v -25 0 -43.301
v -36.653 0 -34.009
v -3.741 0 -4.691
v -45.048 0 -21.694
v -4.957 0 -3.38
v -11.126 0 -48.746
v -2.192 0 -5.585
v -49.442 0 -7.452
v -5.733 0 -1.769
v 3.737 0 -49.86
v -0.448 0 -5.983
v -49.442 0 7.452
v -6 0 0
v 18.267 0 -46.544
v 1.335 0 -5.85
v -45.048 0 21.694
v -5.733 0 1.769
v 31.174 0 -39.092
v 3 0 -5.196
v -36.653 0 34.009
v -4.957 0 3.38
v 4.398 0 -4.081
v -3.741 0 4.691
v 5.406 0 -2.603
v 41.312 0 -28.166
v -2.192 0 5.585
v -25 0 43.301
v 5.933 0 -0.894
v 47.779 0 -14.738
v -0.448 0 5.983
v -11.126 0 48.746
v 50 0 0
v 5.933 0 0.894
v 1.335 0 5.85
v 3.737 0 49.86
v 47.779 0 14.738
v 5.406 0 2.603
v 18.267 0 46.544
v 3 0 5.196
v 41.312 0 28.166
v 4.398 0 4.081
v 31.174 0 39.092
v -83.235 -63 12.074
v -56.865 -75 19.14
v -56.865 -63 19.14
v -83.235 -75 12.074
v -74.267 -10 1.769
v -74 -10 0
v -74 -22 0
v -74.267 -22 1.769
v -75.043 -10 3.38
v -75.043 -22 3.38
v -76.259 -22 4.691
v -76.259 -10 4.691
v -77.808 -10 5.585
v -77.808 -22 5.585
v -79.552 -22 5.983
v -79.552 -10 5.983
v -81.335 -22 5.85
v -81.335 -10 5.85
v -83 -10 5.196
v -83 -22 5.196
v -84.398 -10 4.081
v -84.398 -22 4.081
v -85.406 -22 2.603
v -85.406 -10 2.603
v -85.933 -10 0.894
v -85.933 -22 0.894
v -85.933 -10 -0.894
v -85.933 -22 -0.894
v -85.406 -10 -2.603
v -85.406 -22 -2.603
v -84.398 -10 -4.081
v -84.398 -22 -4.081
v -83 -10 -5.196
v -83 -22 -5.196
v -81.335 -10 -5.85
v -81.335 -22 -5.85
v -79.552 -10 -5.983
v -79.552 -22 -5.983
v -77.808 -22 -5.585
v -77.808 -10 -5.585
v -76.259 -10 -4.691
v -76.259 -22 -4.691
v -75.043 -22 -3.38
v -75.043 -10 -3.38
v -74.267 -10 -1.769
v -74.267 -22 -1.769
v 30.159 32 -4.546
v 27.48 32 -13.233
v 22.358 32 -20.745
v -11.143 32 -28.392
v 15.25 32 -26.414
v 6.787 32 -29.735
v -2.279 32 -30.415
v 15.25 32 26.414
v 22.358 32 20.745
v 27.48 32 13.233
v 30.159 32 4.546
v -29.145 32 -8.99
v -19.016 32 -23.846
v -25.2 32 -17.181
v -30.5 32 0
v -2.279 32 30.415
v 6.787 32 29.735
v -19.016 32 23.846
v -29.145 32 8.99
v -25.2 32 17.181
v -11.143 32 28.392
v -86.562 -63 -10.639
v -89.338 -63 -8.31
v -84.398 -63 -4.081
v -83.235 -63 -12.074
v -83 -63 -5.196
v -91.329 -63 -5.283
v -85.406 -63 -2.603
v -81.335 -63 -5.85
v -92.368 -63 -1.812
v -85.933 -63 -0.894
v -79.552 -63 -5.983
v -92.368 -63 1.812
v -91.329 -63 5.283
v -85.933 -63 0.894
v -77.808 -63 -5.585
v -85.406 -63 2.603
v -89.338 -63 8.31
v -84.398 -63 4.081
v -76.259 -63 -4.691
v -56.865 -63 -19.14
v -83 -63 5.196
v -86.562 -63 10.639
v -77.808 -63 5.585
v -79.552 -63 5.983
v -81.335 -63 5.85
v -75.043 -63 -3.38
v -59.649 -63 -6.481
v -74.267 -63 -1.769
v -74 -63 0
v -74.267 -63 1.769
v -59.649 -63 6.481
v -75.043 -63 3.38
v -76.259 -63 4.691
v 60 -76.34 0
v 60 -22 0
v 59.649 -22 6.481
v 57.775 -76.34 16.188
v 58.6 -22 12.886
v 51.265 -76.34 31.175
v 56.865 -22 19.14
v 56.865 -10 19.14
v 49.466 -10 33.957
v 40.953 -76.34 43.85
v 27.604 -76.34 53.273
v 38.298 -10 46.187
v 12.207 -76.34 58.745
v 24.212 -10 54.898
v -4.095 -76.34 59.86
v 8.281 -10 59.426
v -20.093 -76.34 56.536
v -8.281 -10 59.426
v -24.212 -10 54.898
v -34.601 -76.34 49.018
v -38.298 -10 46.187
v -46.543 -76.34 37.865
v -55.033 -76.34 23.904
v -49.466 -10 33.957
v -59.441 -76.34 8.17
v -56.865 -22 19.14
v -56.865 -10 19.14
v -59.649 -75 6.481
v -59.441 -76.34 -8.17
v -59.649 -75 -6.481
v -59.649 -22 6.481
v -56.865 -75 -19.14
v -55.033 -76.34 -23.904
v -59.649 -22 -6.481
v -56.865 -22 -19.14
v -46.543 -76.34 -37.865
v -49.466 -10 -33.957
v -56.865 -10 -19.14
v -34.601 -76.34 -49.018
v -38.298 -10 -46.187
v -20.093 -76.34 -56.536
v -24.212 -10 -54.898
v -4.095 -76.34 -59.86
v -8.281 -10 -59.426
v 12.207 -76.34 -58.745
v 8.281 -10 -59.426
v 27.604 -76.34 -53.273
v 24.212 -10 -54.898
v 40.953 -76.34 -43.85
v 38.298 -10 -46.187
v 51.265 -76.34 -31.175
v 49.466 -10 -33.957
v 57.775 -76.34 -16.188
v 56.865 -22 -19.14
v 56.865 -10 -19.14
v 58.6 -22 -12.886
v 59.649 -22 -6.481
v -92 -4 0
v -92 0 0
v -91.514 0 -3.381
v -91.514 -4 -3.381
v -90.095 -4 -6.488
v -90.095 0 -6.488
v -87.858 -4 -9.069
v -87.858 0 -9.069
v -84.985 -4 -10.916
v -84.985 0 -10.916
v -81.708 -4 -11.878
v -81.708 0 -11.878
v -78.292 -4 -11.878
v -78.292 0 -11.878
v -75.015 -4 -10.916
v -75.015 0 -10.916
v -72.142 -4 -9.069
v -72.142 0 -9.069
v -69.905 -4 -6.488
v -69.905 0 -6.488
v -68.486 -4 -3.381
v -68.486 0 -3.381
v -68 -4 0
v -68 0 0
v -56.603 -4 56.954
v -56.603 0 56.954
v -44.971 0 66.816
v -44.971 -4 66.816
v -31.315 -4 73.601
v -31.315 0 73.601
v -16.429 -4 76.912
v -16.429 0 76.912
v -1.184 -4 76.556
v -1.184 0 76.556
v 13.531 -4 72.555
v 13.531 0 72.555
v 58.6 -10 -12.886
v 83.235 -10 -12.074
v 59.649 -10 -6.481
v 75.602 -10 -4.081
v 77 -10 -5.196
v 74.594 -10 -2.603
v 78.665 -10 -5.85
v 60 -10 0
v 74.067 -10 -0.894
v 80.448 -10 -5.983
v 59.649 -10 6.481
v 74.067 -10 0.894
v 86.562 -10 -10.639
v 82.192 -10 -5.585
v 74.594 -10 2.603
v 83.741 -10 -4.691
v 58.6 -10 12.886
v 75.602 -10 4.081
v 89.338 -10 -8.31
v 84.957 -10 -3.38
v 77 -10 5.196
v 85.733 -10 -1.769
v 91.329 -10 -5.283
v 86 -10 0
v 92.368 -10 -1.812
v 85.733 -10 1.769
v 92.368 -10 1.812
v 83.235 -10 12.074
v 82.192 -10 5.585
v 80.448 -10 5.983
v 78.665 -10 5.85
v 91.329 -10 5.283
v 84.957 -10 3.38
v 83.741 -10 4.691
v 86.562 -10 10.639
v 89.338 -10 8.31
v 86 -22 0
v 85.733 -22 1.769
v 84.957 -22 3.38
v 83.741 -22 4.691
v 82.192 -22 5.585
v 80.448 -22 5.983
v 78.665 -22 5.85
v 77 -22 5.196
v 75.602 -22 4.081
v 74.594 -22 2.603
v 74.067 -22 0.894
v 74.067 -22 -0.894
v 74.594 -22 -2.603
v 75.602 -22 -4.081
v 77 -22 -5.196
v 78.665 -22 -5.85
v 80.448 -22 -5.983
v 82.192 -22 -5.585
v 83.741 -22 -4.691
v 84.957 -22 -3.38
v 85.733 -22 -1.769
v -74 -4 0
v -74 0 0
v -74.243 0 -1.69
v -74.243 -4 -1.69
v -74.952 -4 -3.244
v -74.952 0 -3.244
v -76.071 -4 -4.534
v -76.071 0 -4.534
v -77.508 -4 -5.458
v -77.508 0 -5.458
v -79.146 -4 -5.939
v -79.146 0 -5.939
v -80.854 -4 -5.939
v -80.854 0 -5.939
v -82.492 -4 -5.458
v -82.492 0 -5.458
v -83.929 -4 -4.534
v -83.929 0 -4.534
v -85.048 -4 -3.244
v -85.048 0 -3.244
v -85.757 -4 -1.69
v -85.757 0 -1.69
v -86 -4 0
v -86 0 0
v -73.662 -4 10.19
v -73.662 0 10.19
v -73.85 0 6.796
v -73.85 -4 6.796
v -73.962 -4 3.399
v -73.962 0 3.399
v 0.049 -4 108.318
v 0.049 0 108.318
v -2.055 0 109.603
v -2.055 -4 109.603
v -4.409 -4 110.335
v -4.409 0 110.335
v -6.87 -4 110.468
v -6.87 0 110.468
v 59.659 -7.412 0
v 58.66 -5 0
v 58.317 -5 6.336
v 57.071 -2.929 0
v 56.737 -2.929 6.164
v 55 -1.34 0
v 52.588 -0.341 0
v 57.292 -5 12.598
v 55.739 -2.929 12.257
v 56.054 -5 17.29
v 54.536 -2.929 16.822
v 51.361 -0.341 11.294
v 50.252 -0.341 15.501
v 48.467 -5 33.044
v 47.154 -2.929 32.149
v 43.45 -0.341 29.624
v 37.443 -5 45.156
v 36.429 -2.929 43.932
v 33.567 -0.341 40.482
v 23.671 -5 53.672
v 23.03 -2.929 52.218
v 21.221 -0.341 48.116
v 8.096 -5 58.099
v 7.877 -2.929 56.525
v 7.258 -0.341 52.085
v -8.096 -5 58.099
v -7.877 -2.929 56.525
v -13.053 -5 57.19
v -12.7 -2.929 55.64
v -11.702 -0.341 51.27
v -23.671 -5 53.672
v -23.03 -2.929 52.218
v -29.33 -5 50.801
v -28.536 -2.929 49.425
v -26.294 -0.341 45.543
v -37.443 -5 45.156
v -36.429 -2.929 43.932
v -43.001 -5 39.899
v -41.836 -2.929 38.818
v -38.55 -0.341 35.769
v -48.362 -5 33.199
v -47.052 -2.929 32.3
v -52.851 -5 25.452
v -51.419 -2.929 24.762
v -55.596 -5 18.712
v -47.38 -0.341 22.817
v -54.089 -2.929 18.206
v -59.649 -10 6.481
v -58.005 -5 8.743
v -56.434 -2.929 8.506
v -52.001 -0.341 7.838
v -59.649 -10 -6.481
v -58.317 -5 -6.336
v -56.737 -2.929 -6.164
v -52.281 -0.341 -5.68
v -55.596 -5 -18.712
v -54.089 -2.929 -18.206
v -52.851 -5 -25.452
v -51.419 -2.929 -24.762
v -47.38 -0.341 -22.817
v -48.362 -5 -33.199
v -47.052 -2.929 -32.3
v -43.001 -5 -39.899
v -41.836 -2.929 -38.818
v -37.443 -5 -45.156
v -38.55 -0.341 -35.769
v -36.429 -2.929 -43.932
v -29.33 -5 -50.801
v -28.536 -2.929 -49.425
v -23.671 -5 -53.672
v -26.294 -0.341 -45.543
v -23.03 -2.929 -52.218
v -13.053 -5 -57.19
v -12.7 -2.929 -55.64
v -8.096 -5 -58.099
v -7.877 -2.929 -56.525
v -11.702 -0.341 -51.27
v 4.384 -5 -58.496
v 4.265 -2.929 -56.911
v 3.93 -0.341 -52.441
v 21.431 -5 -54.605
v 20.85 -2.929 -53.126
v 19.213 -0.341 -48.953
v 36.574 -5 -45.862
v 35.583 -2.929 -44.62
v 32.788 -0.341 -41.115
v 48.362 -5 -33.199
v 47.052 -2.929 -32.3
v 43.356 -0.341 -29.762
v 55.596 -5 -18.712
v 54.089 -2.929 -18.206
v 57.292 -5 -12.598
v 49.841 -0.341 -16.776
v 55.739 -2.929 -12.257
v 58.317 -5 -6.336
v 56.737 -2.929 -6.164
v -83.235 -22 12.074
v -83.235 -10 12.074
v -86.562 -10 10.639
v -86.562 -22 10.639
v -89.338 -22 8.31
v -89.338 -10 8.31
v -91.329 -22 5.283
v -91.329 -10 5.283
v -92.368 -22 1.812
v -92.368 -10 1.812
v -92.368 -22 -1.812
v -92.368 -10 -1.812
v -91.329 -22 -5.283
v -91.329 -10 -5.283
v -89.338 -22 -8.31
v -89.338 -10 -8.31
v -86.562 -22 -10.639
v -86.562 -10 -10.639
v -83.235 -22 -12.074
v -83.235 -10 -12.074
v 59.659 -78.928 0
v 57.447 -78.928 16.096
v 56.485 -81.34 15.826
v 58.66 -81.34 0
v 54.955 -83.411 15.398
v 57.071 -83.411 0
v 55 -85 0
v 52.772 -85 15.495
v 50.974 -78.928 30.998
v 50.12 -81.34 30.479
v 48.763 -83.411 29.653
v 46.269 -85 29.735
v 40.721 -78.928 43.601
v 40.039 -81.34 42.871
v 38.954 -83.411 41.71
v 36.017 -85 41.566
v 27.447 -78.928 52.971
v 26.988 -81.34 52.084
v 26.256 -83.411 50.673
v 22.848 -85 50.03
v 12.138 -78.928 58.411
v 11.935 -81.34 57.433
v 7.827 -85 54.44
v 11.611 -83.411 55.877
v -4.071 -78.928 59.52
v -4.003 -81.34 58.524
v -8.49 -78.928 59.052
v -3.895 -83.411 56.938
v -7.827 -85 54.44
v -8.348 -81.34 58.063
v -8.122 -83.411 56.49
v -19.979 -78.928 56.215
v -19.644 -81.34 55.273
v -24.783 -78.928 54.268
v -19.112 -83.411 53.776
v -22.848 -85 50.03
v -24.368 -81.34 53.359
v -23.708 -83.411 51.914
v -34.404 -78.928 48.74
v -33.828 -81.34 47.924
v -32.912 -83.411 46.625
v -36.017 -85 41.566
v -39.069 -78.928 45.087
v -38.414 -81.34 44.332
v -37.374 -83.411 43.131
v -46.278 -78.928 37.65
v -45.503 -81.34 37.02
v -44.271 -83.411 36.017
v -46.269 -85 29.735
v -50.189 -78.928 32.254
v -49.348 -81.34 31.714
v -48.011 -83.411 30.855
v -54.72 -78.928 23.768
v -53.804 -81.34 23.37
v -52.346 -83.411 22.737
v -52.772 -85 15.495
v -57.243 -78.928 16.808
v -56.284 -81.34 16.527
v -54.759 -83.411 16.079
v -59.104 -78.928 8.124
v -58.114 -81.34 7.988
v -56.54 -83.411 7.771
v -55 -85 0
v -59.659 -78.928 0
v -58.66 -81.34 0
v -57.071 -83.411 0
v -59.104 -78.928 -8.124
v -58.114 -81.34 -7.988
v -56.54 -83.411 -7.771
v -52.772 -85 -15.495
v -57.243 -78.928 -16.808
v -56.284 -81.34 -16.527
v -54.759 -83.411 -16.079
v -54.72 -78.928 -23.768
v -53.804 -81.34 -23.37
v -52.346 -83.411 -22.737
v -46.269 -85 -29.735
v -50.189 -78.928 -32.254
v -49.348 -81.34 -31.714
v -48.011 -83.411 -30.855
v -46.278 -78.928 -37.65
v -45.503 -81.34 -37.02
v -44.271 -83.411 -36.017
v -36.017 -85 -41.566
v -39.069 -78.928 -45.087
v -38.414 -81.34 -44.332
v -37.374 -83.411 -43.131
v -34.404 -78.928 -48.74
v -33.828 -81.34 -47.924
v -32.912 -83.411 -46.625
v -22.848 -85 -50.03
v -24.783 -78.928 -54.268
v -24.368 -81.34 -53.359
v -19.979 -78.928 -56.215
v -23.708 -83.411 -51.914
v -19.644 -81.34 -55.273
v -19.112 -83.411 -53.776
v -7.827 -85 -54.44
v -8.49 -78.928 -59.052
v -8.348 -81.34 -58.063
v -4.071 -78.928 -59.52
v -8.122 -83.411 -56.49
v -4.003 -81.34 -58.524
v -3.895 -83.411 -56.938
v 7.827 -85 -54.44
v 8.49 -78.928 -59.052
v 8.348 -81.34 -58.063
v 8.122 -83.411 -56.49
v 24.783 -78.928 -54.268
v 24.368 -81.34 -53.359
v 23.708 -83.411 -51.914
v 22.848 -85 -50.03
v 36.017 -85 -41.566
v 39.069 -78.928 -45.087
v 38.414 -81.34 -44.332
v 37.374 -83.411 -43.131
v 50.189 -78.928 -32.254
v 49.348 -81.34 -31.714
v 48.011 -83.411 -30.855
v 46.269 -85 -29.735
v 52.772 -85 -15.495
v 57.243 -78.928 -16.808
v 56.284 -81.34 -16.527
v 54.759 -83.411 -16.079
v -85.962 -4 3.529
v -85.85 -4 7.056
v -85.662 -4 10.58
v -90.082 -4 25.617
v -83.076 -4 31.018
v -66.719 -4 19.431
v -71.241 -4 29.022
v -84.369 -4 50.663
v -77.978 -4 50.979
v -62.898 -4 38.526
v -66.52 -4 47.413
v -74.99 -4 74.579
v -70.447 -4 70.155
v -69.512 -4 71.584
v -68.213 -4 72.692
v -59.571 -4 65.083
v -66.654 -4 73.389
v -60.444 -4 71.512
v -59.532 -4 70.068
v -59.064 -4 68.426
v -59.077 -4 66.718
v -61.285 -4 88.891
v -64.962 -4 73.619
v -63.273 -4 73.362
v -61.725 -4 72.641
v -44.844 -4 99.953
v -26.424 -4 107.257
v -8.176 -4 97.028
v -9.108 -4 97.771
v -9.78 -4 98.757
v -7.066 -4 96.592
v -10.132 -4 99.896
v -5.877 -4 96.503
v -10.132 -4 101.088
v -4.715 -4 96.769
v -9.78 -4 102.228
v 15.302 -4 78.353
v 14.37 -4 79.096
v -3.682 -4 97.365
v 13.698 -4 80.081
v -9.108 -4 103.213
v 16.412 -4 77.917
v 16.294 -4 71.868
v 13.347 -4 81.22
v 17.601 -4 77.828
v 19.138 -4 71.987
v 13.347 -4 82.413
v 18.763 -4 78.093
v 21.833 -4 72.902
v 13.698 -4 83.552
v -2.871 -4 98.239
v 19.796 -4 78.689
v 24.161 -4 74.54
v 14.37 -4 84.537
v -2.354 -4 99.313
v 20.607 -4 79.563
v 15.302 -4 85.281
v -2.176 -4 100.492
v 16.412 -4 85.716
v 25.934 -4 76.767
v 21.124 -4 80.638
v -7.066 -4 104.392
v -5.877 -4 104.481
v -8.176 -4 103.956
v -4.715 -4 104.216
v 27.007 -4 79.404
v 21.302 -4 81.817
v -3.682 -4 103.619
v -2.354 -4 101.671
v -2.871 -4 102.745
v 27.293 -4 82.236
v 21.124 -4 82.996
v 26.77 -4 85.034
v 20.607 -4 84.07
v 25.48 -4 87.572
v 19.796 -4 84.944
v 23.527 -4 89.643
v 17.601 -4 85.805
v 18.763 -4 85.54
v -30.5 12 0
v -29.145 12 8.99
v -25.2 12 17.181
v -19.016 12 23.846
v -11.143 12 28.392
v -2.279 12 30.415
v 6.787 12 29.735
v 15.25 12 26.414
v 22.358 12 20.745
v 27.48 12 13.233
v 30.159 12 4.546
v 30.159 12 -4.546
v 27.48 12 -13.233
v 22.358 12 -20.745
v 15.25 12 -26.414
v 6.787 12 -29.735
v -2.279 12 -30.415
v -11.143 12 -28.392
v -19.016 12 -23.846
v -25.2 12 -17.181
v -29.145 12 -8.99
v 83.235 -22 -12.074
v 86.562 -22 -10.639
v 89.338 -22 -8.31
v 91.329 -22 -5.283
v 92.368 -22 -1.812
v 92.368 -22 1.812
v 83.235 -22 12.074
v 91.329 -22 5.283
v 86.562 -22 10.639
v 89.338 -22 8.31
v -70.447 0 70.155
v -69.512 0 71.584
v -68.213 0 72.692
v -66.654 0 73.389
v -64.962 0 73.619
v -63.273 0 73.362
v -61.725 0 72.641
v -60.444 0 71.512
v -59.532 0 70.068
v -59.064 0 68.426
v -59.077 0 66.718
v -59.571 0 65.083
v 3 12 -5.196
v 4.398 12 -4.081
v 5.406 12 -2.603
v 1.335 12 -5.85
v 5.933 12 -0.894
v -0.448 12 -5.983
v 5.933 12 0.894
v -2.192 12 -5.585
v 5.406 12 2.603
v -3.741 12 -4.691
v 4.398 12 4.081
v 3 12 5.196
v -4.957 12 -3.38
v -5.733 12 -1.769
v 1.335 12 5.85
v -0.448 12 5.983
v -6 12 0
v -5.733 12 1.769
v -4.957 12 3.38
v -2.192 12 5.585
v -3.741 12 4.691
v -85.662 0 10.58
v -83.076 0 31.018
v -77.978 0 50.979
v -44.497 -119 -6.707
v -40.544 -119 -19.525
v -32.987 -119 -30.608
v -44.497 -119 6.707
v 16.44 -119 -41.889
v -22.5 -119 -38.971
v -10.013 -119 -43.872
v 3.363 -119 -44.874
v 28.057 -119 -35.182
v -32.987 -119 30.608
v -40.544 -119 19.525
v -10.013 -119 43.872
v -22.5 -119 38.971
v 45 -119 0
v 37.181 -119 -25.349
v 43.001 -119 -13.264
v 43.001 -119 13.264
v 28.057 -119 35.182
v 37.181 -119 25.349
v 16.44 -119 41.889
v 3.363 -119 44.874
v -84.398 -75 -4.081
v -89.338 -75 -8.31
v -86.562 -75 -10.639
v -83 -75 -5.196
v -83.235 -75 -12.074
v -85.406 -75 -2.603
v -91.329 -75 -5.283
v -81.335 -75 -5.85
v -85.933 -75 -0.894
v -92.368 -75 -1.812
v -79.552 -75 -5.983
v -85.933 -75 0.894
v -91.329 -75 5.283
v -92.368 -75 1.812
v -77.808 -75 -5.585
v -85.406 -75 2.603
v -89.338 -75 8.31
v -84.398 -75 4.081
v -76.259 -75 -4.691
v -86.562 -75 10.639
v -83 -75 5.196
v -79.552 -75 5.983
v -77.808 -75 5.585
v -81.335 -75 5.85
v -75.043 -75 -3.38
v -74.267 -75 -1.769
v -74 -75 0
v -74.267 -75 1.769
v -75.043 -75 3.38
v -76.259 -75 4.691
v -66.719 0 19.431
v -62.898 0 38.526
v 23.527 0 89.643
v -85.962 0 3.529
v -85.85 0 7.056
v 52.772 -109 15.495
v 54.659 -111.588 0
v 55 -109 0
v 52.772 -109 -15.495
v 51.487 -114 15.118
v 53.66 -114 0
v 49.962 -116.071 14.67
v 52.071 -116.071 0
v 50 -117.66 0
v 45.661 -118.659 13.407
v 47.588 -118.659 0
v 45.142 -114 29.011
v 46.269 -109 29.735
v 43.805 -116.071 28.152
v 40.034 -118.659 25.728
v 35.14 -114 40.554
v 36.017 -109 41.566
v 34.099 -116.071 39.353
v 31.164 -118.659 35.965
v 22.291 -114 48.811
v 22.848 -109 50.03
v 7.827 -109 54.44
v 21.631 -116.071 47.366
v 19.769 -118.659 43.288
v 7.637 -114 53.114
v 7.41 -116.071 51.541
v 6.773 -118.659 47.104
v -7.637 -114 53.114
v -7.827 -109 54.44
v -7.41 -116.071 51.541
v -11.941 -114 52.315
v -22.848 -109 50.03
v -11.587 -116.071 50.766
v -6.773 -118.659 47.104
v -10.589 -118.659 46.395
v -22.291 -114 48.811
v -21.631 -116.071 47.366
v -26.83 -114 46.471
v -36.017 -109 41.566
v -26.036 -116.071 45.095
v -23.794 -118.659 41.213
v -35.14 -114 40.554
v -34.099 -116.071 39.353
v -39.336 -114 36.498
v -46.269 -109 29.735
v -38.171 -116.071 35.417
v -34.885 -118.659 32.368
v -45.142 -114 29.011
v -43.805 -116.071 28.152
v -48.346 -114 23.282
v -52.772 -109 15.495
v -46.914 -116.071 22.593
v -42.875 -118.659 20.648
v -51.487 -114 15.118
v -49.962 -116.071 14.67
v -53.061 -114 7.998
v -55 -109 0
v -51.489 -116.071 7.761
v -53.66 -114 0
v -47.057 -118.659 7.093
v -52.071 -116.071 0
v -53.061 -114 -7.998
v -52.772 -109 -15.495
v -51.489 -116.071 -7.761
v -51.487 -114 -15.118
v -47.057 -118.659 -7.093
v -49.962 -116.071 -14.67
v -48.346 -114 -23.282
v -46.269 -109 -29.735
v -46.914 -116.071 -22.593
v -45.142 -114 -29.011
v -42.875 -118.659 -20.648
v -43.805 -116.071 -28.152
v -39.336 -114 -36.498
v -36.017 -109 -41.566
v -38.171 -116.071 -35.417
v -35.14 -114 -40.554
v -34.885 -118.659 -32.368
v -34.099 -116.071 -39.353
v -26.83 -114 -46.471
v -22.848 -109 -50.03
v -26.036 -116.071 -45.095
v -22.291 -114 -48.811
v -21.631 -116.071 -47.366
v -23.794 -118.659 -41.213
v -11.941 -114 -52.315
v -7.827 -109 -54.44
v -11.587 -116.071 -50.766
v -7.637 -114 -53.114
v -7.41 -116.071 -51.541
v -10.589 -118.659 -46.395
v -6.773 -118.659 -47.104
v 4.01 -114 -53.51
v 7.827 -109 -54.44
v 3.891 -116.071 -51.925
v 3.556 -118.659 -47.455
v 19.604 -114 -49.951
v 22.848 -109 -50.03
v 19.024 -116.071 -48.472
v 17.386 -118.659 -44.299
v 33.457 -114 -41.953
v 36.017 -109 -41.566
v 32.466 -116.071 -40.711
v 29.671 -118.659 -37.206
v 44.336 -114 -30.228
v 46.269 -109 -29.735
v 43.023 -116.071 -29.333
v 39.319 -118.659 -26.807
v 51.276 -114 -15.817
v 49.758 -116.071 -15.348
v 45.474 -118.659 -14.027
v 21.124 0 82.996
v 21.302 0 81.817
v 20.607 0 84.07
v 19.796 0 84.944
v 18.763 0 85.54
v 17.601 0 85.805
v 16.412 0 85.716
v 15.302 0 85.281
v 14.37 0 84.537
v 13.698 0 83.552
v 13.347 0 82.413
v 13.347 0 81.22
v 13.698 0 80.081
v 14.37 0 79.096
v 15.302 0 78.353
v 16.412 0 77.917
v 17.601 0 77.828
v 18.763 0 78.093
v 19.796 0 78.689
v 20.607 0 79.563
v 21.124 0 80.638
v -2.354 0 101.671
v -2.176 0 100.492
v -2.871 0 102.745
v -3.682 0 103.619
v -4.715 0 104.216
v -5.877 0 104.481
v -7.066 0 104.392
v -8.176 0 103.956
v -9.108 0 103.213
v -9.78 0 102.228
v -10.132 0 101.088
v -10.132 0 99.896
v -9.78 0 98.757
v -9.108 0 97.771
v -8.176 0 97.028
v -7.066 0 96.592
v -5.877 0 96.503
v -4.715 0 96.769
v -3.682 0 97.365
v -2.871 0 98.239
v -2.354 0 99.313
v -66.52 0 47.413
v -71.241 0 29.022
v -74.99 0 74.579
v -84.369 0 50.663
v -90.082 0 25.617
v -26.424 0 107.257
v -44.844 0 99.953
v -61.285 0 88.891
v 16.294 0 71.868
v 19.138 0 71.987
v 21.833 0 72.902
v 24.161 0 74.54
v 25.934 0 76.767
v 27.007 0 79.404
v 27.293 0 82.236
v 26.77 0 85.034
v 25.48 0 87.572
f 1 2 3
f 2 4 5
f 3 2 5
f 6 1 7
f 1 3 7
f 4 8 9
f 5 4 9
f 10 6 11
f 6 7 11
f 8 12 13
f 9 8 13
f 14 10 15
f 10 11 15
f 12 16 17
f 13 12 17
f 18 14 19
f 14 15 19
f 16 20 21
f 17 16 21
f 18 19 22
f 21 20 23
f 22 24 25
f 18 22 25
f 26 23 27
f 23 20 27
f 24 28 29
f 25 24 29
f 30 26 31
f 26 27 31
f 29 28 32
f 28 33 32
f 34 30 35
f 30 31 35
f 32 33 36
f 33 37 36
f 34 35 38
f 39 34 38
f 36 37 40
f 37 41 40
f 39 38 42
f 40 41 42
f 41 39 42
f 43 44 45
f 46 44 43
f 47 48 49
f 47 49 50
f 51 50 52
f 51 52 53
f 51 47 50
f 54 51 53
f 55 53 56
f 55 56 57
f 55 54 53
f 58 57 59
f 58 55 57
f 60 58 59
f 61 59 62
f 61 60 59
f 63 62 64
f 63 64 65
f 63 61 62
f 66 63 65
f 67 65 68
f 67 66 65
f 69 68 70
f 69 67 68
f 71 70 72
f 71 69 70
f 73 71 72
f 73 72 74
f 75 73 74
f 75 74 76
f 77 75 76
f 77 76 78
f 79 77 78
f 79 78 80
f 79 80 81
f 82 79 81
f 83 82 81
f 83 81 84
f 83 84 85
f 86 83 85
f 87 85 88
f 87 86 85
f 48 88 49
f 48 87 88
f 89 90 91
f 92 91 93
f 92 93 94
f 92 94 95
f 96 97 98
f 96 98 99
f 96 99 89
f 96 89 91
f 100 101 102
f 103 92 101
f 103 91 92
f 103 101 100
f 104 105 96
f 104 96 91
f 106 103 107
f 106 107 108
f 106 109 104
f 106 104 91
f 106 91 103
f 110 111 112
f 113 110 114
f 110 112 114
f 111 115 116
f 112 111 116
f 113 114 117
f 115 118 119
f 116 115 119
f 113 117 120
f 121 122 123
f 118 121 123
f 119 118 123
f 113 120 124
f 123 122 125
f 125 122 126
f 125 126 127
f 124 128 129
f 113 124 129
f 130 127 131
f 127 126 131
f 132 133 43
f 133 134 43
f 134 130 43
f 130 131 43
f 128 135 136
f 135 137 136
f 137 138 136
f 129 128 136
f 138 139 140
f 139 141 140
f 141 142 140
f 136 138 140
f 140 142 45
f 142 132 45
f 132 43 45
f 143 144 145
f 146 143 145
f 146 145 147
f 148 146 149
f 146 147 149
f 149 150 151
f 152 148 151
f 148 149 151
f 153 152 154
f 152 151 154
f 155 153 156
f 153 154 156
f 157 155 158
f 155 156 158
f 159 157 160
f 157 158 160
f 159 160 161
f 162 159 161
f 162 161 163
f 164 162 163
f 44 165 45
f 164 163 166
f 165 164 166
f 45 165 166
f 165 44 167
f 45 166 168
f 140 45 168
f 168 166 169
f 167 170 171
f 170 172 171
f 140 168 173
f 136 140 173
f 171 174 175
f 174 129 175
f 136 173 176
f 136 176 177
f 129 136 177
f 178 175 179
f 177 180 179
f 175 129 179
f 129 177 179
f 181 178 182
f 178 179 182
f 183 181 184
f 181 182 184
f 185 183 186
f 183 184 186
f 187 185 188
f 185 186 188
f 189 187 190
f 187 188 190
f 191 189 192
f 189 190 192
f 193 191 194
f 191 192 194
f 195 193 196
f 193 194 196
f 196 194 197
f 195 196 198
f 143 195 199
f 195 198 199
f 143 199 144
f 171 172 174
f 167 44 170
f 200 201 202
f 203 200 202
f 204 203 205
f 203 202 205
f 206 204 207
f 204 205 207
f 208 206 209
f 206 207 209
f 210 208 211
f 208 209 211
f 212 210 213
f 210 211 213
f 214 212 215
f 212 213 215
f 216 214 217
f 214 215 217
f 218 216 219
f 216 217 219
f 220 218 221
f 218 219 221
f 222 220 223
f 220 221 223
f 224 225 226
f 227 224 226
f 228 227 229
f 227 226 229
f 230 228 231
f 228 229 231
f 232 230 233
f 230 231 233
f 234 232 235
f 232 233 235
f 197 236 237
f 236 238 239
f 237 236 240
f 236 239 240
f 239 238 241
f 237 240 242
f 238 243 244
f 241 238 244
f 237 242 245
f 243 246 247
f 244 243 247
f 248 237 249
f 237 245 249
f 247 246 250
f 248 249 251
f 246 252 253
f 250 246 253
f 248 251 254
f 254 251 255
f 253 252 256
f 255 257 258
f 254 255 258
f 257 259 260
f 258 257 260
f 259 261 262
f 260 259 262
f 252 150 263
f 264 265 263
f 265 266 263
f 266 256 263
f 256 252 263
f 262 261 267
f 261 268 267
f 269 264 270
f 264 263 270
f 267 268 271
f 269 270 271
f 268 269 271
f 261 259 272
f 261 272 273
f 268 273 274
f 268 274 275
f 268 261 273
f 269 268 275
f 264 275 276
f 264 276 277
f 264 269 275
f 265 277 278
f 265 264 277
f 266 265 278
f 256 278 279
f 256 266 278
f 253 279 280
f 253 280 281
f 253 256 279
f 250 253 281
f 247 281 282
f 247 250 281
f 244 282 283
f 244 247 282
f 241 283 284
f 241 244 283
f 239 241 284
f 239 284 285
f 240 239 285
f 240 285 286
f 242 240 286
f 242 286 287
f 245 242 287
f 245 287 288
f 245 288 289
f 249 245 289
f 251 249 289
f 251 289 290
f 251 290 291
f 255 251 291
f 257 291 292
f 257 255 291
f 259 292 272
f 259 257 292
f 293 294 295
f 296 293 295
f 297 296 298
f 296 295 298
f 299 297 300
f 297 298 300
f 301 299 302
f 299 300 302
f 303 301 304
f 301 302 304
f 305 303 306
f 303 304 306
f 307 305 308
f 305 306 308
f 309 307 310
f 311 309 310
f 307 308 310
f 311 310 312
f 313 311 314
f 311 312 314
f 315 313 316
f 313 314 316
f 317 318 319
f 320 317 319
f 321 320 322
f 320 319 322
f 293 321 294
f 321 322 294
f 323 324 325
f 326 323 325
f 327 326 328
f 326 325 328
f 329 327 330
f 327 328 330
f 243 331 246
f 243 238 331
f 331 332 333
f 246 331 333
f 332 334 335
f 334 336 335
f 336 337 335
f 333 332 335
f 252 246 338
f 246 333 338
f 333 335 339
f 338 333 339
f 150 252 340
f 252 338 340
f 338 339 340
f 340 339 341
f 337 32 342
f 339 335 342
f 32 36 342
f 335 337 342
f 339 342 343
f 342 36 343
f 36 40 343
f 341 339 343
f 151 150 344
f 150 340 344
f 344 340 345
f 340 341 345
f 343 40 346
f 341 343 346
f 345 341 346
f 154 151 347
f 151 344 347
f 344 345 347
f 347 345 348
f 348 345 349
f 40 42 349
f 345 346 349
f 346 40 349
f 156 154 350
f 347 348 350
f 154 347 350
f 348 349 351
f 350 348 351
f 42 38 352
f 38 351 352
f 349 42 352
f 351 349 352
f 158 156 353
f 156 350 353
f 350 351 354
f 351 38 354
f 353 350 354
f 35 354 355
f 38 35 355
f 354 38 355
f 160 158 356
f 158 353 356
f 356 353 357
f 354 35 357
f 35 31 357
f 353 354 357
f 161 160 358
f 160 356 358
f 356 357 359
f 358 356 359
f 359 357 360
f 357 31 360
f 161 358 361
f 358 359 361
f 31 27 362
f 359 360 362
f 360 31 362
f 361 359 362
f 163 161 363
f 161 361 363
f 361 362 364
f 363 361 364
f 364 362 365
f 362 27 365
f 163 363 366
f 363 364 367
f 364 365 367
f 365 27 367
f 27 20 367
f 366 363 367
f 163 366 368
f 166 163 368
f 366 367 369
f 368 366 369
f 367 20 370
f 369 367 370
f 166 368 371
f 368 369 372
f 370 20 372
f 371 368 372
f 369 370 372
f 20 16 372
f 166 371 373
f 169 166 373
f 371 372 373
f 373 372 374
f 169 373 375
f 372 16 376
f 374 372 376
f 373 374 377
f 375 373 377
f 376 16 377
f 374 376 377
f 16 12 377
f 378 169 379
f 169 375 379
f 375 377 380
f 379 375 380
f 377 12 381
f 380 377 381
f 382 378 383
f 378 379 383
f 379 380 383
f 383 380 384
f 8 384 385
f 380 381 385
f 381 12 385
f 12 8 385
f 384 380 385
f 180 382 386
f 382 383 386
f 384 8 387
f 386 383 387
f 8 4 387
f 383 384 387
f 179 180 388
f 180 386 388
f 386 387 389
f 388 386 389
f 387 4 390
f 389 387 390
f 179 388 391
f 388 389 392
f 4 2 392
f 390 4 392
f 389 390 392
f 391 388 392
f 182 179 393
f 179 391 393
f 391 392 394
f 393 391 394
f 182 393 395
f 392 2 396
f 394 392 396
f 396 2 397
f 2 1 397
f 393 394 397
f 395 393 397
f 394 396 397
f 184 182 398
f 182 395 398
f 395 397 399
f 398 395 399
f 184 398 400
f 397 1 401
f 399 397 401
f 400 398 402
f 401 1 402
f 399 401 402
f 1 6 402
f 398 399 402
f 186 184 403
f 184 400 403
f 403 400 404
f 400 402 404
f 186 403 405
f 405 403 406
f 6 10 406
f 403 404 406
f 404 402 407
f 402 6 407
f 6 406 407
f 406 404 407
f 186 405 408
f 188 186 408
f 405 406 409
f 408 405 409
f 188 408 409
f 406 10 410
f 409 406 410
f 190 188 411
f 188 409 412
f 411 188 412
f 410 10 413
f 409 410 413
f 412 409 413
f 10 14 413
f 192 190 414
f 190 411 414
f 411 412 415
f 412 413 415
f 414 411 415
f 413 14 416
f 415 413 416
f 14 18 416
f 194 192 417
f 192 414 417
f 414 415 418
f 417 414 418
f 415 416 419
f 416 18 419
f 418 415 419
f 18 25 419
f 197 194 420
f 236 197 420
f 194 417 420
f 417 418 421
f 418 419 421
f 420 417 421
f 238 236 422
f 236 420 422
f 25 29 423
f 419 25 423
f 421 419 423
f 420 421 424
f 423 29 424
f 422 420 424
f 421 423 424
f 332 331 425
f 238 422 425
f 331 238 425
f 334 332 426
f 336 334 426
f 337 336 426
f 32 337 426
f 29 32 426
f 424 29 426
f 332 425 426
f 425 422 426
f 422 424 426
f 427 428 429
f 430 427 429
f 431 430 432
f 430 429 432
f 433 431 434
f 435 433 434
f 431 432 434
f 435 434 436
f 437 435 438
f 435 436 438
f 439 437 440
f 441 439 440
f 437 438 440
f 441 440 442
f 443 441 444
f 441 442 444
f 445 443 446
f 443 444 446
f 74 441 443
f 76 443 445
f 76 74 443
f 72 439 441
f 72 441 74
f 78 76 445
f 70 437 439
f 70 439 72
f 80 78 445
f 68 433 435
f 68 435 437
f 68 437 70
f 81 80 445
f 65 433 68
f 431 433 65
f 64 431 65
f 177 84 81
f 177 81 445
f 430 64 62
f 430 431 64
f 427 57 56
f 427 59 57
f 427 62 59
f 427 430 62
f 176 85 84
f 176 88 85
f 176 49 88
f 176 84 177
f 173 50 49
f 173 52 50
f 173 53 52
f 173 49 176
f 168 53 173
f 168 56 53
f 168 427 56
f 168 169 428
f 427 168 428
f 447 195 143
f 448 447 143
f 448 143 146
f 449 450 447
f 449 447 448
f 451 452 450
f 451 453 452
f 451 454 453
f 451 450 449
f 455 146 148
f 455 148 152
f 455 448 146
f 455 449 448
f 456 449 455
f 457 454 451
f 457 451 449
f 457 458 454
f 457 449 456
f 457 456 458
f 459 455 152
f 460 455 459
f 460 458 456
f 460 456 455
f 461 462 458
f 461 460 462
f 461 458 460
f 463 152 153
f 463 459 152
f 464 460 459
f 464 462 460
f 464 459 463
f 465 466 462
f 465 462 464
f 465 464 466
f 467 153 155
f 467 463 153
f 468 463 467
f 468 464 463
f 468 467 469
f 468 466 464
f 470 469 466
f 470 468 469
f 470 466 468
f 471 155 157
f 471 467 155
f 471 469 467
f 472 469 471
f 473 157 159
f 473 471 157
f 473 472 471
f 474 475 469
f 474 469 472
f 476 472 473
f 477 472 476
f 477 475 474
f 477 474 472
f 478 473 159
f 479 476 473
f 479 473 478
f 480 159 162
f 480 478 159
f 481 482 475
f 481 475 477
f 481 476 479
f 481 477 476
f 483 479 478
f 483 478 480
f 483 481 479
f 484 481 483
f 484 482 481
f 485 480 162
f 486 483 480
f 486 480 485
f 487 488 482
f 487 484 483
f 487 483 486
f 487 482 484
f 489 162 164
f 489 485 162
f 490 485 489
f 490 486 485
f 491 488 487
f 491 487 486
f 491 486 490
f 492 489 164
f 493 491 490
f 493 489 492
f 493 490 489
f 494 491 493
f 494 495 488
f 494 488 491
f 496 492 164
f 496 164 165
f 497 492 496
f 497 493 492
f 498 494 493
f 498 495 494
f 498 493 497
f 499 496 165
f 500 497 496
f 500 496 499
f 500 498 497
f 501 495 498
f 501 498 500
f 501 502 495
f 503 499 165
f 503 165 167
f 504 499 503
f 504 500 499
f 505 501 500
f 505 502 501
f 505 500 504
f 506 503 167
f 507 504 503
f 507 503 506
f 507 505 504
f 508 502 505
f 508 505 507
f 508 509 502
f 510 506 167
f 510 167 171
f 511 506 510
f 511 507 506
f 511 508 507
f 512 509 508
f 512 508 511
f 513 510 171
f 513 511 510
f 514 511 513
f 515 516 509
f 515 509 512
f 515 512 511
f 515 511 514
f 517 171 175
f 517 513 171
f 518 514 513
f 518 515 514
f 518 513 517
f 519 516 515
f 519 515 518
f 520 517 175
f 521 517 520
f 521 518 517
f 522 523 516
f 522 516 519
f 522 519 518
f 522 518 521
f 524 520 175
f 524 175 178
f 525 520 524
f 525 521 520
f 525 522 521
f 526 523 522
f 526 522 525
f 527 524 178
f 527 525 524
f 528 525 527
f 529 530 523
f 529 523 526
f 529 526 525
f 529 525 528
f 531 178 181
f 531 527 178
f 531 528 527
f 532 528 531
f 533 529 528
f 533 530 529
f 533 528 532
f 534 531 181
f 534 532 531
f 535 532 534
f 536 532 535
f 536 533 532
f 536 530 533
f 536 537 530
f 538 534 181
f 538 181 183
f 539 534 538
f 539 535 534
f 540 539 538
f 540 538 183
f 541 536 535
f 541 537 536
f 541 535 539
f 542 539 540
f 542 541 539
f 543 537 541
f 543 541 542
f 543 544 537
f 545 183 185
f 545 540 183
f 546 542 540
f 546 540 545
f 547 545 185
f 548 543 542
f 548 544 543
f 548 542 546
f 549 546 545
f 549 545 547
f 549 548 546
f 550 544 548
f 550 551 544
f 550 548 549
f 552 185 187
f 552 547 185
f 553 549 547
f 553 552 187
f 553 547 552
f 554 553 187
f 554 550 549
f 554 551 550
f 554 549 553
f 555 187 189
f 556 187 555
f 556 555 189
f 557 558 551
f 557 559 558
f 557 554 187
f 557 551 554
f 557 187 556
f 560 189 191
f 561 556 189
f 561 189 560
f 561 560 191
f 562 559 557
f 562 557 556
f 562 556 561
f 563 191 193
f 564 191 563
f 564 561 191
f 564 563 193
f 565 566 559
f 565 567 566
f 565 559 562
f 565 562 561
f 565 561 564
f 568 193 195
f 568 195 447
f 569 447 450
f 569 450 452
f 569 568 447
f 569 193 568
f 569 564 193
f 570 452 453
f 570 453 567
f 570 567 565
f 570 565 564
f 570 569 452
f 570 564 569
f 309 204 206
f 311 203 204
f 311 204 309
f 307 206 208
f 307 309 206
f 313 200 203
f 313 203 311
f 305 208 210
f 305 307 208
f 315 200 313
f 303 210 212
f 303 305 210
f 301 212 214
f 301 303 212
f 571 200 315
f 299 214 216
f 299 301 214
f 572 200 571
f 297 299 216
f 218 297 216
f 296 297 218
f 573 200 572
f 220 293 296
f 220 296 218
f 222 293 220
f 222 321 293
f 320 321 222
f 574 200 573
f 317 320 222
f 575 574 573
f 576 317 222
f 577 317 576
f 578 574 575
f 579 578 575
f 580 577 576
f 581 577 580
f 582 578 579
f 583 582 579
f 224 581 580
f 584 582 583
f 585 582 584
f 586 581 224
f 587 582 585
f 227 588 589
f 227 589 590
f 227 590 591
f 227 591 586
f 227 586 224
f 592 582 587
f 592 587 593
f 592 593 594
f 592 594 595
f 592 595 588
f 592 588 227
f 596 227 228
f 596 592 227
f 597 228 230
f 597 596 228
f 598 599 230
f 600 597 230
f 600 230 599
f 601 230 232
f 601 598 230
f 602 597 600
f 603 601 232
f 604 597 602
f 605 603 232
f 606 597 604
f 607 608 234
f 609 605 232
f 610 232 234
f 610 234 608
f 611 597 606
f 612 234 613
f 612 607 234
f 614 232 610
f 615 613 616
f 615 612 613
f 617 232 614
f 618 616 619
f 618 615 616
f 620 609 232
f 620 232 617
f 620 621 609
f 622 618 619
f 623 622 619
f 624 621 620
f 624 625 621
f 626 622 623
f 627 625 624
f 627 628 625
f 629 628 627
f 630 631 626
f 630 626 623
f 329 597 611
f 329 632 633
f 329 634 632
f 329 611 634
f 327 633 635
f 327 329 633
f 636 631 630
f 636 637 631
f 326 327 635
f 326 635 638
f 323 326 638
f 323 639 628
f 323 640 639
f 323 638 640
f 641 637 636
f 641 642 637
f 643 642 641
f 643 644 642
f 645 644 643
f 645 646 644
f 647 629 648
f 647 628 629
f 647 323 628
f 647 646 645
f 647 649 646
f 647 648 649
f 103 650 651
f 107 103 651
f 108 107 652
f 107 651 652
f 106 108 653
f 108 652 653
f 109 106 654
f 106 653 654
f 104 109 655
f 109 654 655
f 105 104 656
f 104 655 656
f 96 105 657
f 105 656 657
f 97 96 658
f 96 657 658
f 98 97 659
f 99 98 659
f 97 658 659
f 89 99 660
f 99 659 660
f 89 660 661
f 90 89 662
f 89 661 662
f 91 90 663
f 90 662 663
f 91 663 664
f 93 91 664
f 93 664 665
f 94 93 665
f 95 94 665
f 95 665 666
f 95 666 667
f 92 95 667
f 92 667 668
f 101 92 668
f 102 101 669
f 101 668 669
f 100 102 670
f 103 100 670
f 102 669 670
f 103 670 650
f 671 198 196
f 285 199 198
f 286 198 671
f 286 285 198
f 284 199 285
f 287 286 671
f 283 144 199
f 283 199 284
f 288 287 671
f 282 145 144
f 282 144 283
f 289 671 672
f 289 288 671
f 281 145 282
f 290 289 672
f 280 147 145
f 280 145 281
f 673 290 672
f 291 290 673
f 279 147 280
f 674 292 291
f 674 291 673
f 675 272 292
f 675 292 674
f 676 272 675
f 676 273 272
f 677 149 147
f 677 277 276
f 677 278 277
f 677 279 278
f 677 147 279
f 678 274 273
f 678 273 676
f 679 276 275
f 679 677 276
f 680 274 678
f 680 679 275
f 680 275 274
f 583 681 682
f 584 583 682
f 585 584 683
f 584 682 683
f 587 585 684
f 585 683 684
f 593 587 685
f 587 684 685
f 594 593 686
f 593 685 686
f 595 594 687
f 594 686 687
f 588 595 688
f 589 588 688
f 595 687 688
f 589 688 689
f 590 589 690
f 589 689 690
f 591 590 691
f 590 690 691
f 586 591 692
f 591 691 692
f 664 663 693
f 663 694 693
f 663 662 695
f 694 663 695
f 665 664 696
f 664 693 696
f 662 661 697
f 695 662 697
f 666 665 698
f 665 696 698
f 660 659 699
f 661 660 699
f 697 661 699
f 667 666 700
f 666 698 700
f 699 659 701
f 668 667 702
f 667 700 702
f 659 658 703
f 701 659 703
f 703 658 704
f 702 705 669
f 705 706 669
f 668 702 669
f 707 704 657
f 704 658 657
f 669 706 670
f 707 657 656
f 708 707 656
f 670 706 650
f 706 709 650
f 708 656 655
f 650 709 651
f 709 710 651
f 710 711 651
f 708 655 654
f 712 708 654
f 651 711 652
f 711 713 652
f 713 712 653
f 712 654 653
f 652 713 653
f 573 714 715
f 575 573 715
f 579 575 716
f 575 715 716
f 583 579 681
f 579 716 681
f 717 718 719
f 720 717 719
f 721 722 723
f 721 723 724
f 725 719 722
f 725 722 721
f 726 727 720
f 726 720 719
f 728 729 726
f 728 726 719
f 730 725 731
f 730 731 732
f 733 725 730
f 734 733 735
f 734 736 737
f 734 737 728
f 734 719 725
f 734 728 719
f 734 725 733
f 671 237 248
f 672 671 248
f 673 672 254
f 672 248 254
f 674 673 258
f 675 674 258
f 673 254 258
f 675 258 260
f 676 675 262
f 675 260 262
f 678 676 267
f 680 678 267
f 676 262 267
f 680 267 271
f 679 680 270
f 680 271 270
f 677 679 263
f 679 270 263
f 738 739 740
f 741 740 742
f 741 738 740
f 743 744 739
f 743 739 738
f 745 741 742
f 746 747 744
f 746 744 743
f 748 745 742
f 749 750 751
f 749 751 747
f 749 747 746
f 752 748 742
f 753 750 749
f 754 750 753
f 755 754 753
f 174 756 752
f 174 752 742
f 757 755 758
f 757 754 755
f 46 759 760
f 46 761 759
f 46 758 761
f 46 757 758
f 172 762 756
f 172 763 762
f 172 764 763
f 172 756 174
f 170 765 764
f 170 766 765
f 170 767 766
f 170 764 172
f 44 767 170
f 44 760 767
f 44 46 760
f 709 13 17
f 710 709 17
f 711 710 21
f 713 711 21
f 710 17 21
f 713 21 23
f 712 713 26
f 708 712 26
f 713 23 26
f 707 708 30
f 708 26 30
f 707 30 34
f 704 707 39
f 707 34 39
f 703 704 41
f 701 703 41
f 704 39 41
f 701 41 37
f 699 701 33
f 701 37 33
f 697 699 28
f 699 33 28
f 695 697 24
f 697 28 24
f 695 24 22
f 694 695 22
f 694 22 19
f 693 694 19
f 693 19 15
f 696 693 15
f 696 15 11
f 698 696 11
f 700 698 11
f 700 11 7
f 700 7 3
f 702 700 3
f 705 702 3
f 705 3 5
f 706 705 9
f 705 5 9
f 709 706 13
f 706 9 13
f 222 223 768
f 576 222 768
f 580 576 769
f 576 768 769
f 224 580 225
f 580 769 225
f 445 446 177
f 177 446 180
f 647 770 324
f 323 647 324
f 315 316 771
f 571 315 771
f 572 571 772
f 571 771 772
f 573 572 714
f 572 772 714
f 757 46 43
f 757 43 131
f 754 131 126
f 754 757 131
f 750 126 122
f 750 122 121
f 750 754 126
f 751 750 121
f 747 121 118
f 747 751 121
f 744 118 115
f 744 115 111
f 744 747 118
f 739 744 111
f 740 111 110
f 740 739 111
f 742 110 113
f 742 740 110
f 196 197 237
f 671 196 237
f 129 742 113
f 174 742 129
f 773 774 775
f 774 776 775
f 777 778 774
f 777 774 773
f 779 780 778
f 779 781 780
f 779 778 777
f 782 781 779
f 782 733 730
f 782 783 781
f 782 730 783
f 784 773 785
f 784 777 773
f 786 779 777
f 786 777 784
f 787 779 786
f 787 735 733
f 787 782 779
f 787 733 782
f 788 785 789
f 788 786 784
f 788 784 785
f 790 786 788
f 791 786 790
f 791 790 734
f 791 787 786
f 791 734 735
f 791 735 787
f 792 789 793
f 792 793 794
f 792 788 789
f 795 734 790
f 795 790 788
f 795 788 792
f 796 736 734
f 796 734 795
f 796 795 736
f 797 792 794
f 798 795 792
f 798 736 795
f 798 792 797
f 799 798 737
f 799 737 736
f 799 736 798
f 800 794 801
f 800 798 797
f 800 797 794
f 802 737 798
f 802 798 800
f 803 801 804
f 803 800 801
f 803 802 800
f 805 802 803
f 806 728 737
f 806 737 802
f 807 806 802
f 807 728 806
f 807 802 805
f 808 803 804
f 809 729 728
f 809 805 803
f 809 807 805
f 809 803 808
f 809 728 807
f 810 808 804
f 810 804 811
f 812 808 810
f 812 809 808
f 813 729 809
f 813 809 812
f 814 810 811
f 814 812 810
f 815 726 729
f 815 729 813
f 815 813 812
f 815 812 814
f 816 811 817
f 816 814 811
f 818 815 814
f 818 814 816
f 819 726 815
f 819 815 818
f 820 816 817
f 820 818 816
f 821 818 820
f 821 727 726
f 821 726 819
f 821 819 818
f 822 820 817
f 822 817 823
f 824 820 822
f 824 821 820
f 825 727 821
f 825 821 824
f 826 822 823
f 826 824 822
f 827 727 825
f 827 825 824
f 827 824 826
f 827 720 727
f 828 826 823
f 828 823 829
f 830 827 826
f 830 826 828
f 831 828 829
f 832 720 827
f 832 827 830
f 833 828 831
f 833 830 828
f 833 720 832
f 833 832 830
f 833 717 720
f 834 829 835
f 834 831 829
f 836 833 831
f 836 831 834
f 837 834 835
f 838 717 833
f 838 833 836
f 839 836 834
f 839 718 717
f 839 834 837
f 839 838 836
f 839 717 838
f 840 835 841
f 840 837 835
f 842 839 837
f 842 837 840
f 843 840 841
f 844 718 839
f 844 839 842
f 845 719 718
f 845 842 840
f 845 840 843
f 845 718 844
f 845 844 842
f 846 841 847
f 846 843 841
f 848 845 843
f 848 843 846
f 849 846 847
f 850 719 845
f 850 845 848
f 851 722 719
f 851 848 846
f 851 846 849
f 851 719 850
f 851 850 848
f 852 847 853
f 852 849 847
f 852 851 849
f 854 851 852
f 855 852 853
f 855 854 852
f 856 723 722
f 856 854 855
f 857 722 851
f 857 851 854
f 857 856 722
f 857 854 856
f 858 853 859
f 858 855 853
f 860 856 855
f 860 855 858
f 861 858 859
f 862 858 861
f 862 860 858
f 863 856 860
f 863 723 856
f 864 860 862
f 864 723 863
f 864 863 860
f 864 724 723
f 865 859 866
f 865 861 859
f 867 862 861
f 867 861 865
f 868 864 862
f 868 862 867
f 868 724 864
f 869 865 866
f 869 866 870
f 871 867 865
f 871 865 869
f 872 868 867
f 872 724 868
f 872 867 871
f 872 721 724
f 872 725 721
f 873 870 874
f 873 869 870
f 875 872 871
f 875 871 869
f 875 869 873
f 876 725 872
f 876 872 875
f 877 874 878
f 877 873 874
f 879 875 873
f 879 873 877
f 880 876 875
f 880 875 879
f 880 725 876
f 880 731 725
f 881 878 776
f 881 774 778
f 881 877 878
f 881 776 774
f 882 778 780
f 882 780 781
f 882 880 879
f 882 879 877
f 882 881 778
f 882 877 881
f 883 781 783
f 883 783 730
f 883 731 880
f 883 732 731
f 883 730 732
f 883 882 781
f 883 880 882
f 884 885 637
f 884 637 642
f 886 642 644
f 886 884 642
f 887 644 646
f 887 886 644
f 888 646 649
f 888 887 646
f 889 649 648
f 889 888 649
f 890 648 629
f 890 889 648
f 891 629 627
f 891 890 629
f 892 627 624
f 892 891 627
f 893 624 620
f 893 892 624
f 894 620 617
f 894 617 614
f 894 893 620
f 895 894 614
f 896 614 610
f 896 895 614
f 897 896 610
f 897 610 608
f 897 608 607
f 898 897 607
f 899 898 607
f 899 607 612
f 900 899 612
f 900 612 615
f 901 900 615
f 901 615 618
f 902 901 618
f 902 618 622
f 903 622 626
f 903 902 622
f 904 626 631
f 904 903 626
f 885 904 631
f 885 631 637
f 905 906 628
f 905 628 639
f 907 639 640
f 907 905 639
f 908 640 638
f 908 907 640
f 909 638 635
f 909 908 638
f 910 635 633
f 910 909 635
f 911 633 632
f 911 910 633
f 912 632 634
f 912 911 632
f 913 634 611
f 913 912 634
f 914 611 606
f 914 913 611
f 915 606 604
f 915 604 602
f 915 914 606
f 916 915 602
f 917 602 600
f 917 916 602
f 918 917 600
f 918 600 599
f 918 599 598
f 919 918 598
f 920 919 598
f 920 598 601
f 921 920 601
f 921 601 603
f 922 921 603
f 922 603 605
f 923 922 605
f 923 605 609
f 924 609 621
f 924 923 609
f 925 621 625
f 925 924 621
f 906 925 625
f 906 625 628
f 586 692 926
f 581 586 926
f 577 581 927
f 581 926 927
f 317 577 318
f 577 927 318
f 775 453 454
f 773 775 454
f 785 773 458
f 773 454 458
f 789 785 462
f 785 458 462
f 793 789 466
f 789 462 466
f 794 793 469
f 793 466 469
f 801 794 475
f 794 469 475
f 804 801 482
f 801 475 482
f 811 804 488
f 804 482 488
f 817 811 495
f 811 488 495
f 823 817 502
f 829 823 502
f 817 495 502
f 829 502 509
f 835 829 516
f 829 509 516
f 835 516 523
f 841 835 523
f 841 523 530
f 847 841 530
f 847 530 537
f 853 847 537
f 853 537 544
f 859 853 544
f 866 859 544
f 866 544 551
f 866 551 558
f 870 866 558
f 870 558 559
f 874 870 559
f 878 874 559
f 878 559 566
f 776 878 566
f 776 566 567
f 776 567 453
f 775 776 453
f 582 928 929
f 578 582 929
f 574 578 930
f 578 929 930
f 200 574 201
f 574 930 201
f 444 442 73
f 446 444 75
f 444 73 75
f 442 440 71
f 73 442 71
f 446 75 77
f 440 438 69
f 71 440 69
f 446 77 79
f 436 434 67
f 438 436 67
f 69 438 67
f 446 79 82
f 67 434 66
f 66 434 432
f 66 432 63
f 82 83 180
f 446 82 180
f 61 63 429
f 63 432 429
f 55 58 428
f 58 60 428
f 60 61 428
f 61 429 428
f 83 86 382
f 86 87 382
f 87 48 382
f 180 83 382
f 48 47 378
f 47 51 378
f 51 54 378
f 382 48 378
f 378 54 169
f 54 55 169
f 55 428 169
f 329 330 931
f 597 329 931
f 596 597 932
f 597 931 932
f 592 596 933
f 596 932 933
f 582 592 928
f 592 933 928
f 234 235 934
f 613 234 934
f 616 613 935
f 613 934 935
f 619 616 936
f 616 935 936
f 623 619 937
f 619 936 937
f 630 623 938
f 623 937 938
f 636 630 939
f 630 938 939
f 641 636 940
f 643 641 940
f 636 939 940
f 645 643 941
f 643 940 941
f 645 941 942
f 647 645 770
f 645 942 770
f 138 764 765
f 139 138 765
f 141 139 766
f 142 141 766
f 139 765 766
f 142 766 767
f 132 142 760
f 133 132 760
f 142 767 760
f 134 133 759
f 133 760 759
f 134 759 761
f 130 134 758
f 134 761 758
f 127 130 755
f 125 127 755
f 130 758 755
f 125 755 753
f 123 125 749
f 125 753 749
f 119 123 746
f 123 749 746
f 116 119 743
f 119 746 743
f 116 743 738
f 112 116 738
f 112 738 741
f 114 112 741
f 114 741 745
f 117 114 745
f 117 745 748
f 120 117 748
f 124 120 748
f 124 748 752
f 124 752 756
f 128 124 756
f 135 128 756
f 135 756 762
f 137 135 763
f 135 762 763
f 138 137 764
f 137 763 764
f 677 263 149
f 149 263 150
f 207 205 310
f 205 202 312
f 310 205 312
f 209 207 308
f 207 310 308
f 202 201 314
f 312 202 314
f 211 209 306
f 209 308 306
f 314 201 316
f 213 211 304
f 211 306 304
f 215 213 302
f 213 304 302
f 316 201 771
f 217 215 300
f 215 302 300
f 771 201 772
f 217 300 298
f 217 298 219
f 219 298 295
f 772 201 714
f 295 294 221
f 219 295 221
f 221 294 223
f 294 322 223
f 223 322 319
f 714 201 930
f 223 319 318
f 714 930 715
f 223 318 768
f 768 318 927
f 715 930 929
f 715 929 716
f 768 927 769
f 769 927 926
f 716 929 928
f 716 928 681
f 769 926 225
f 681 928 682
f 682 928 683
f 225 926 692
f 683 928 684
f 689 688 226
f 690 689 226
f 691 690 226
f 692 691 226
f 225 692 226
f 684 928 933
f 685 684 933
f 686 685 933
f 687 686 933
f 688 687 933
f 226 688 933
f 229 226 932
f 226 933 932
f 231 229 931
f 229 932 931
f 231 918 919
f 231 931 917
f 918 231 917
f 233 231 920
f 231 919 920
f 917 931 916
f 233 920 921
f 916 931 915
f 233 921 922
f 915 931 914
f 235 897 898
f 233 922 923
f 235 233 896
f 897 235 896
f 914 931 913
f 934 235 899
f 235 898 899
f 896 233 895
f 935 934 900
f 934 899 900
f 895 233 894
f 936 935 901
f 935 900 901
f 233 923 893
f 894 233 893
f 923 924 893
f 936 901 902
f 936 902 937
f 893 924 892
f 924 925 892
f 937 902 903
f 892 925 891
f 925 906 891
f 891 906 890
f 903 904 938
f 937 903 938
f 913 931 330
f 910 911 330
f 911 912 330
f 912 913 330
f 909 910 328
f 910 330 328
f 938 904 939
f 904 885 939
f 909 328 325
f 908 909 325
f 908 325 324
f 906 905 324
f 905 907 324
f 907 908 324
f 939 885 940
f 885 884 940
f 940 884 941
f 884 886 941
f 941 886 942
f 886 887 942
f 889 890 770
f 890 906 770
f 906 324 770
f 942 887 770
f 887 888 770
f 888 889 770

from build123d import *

# Parameters (mm, degrees)
F0_R      = 60
F1_DEPTH  = 85
F2_R      = 55
F3_DEPTH  = 34
F5_R      = 6
F6_DEPTH  = 12
F7_R      = 30.5
F8_DEPTH  = 20
F10_R     = 6
F11_DEPTH = 12
F13_R     = 6
F14_DEPTH = 12
F15_R     = 4
F16_DEPTH = 4


# Not quite as in the source:
# - a fillet or chamfer that OpenCascade refuses, or shapes differently, is made with other operations: its cross-section is extruded or revolved along the edge and cut away or added


with BuildPart() as f1:
    # F0 (on Front) → F1 (new body)
    with BuildSketch(Plane.XZ):
        Circle(F0_R)
    extrude(amount=F1_DEPTH)

    # F2 (on face) → F3 (join)
    with BuildSketch(Plane.XZ.offset(85)):
        Circle(F2_R)
    extrude(amount=F3_DEPTH)

    # F4: fillet of radius 10 on 3 edges, made by hand

    # F4_s1 → F4_t2 (revolve, cut)
    with BuildSketch(Plane.XY):
        with BuildLine():
            ThreePointArc((60, -10), (57.0710678119, -2.9289321881), (50, 0))
            Line((50, 0), (60, 0))
            Line((60, 0), (60, -10))
        make_face()
    revolve(axis=Axis((0, 0, 0), (0, -1, 0)), mode=Mode.SUBTRACT)

    # F4_s3 → F4_t4 (revolve, cut)
    with BuildSketch(Plane.XY):
        with BuildLine():
            ThreePointArc((60, -76.3397459622), (58.6602540378, -81.3397459622), (55, -85))
            Line((55, -85), (60, -85))
            Line((60, -85), (60, -76.3397459622))
        make_face()
    revolve(axis=Axis((0, -85, 0), (0, -1, 0)), mode=Mode.SUBTRACT)

    # F4_s5 → F4_t6 (revolve, cut)
    with BuildSketch(Plane.XY):
        with BuildLine():
            ThreePointArc((55, -109), (52.0710678119, -116.0710678119), (45, -119))
            Line((45, -119), (55, -119))
            Line((55, -119), (55, -109))
        make_face()
    revolve(axis=Axis((0, -119, 0), (0, -1, 0)), mode=Mode.SUBTRACT)

    # F5 (on face) → F6 (join)
    with BuildSketch(Plane(origin=(0, 0, 0), x_dir=(-1, 0, 0), z_dir=(0, 1, 0))):
        Circle(F5_R)
    extrude(amount=F6_DEPTH)

    # F7 (on face) → F8 (join)
    with BuildSketch(Plane(origin=(0, 12, 0), x_dir=(-1, 0, 0), z_dir=(0, 1, 0))):
        Circle(F7_R)
    extrude(amount=F8_DEPTH)

    # F10 (on offset) → F11 (join)
    with BuildSketch(Plane.XZ.offset(10)):
        with BuildLine():
            Line((56.8653269235, -19.1398692231), (83.2352380638, -12.0740728286))
            ThreePointArc((83.2352380638, -12.0740728286), (92.5, 0), (83.2352380638, 12.0740728286))
            Line((83.2352380638, 12.0740728286), (56.8653269235, 19.1398692231))
            ThreePointArc((56.8653269235, 19.1398692231), (60, 0), (56.8653269235, -19.1398692231))
        make_face()
        with Locations((80, 0)):
            Circle(F10_R, mode=Mode.SUBTRACT)
        with BuildLine():
            Line((-56.8653269235, 19.1398692231), (-83.2352380638, 12.0740728286))
            ThreePointArc((-83.2352380638, 12.0740728286), (-92.5, 0), (-83.2352380638, -12.0740728286))
            Line((-83.2352380638, -12.0740728286), (-56.8653269235, -19.1398692231))
            ThreePointArc((-56.8653269235, -19.1398692231), (-60, 0), (-56.8653269235, 19.1398692231))
        make_face()
        with Locations((-80, 0)):
            Circle(F10_R, mode=Mode.SUBTRACT)
    extrude(amount=F11_DEPTH)

    # F13 (on offset) → F14 (join)
    with BuildSketch(Plane.XZ.offset(75)):
        with BuildLine():
            Line((-83.2352380638, -12.0740728286), (-56.8653269235, -19.1398692231))
            ThreePointArc((-56.8653269235, -19.1398692231), (-60, 0), (-56.8653269235, 19.1398692231))
            Line((-56.8653269235, 19.1398692231), (-83.2352380638, 12.0740728286))
            ThreePointArc((-83.2352380638, 12.0740728286), (-92.5, 0), (-83.2352380638, -12.0740728286))
        make_face()
        with Locations((-80, 0)):
            Circle(F13_R, mode=Mode.SUBTRACT)
    extrude(amount=-F14_DEPTH)


with BuildPart() as f16:
    # F15 (on Front) → F16 (new body)
    with BuildSketch(Plane.XZ):
        with BuildLine():
            ThreePointArc((-74, -1.341e-07), (-80.000000067, -6), (-86, 0))
            ThreePointArc((-86, 0), (-85.9156035459, 5.2926836293), (-85.6625, 10.5799855269))
            ThreePointArc((-85.6625, 10.5799855269), (-90.2944159621, 6.1664414373), (-92, 0))
            ThreePointArc((-92, 0), (-80, -12), (-68, 0))
            ThreePointArc((-68, 0), (-69.5107197578, 5.8288077683), (-73.6625, 10.1899996933))
            ThreePointArc((-73.6625, 10.1899996933), (-73.9156018755, 5.0977935734), (-74, -1.341e-07))
        make_face()
        with BuildLine():
            ThreePointArc((-92, 0), (-90.2944159621, 6.1664414373), (-85.6625, 10.5799855269))
            ThreePointArc((-85.6625, 10.5799855269), (-80.8371948593, 41.077935072), (-70.4470926481, 70.154631449))
            ThreePointArc((-70.4470926481, 70.154631449), (-62.4735363554, 73.0567686007), (-59.5713992036, 65.0832123081))
            ThreePointArc((-59.5713992036, 65.0832123081), (-69.1638230548, 38.2903890247), (-73.6625, 10.1899996933))
            ThreePointArc((-73.6625, 10.1899996933), (-69.5107197578, 5.8288077683), (-68, 0))
            ThreePointArc((-68, 0), (-65.1226661747, 29.0415523406), (-56.602543752, 56.9538852096))
            ThreePointArc((-56.602543752, 56.9538852096), (-23.9720972385, 75.7077221411), (13.5313898709, 72.5548038174))
            ThreePointArc((13.5313898709, 72.5548038174), (25.933712547, 76.7674690687), (23.5271965971, 89.6427491536))
            Line((23.5271965971, 89.6427491536), (0.0489518915, 108.3181882527))
            ThreePointArc((0.0489518915, 108.3181882527), (-3.2091779587, 110.0418089305), (-6.8704149318, 110.4679804784))
            ThreePointArc((-6.8704149318, 110.4679804784), (-44.8441817754, 99.9525565554), (-74.9901091983, 74.5792601914))
            ThreePointArc((-74.9901091983, 74.5792601914), (-87.6936176217, 38.247230082), (-92, 0))
        make_face()
        with Locations((-6.1761944749, 100.4921066842)):
            Circle(F15_R, mode=Mode.SUBTRACT)
        with Locations((17.3020502307, 81.8166675851)):
            Circle(F15_R, mode=Mode.SUBTRACT)
    extrude(amount=F16_DEPTH)


solid = Compound([f1.part, f16.part])
